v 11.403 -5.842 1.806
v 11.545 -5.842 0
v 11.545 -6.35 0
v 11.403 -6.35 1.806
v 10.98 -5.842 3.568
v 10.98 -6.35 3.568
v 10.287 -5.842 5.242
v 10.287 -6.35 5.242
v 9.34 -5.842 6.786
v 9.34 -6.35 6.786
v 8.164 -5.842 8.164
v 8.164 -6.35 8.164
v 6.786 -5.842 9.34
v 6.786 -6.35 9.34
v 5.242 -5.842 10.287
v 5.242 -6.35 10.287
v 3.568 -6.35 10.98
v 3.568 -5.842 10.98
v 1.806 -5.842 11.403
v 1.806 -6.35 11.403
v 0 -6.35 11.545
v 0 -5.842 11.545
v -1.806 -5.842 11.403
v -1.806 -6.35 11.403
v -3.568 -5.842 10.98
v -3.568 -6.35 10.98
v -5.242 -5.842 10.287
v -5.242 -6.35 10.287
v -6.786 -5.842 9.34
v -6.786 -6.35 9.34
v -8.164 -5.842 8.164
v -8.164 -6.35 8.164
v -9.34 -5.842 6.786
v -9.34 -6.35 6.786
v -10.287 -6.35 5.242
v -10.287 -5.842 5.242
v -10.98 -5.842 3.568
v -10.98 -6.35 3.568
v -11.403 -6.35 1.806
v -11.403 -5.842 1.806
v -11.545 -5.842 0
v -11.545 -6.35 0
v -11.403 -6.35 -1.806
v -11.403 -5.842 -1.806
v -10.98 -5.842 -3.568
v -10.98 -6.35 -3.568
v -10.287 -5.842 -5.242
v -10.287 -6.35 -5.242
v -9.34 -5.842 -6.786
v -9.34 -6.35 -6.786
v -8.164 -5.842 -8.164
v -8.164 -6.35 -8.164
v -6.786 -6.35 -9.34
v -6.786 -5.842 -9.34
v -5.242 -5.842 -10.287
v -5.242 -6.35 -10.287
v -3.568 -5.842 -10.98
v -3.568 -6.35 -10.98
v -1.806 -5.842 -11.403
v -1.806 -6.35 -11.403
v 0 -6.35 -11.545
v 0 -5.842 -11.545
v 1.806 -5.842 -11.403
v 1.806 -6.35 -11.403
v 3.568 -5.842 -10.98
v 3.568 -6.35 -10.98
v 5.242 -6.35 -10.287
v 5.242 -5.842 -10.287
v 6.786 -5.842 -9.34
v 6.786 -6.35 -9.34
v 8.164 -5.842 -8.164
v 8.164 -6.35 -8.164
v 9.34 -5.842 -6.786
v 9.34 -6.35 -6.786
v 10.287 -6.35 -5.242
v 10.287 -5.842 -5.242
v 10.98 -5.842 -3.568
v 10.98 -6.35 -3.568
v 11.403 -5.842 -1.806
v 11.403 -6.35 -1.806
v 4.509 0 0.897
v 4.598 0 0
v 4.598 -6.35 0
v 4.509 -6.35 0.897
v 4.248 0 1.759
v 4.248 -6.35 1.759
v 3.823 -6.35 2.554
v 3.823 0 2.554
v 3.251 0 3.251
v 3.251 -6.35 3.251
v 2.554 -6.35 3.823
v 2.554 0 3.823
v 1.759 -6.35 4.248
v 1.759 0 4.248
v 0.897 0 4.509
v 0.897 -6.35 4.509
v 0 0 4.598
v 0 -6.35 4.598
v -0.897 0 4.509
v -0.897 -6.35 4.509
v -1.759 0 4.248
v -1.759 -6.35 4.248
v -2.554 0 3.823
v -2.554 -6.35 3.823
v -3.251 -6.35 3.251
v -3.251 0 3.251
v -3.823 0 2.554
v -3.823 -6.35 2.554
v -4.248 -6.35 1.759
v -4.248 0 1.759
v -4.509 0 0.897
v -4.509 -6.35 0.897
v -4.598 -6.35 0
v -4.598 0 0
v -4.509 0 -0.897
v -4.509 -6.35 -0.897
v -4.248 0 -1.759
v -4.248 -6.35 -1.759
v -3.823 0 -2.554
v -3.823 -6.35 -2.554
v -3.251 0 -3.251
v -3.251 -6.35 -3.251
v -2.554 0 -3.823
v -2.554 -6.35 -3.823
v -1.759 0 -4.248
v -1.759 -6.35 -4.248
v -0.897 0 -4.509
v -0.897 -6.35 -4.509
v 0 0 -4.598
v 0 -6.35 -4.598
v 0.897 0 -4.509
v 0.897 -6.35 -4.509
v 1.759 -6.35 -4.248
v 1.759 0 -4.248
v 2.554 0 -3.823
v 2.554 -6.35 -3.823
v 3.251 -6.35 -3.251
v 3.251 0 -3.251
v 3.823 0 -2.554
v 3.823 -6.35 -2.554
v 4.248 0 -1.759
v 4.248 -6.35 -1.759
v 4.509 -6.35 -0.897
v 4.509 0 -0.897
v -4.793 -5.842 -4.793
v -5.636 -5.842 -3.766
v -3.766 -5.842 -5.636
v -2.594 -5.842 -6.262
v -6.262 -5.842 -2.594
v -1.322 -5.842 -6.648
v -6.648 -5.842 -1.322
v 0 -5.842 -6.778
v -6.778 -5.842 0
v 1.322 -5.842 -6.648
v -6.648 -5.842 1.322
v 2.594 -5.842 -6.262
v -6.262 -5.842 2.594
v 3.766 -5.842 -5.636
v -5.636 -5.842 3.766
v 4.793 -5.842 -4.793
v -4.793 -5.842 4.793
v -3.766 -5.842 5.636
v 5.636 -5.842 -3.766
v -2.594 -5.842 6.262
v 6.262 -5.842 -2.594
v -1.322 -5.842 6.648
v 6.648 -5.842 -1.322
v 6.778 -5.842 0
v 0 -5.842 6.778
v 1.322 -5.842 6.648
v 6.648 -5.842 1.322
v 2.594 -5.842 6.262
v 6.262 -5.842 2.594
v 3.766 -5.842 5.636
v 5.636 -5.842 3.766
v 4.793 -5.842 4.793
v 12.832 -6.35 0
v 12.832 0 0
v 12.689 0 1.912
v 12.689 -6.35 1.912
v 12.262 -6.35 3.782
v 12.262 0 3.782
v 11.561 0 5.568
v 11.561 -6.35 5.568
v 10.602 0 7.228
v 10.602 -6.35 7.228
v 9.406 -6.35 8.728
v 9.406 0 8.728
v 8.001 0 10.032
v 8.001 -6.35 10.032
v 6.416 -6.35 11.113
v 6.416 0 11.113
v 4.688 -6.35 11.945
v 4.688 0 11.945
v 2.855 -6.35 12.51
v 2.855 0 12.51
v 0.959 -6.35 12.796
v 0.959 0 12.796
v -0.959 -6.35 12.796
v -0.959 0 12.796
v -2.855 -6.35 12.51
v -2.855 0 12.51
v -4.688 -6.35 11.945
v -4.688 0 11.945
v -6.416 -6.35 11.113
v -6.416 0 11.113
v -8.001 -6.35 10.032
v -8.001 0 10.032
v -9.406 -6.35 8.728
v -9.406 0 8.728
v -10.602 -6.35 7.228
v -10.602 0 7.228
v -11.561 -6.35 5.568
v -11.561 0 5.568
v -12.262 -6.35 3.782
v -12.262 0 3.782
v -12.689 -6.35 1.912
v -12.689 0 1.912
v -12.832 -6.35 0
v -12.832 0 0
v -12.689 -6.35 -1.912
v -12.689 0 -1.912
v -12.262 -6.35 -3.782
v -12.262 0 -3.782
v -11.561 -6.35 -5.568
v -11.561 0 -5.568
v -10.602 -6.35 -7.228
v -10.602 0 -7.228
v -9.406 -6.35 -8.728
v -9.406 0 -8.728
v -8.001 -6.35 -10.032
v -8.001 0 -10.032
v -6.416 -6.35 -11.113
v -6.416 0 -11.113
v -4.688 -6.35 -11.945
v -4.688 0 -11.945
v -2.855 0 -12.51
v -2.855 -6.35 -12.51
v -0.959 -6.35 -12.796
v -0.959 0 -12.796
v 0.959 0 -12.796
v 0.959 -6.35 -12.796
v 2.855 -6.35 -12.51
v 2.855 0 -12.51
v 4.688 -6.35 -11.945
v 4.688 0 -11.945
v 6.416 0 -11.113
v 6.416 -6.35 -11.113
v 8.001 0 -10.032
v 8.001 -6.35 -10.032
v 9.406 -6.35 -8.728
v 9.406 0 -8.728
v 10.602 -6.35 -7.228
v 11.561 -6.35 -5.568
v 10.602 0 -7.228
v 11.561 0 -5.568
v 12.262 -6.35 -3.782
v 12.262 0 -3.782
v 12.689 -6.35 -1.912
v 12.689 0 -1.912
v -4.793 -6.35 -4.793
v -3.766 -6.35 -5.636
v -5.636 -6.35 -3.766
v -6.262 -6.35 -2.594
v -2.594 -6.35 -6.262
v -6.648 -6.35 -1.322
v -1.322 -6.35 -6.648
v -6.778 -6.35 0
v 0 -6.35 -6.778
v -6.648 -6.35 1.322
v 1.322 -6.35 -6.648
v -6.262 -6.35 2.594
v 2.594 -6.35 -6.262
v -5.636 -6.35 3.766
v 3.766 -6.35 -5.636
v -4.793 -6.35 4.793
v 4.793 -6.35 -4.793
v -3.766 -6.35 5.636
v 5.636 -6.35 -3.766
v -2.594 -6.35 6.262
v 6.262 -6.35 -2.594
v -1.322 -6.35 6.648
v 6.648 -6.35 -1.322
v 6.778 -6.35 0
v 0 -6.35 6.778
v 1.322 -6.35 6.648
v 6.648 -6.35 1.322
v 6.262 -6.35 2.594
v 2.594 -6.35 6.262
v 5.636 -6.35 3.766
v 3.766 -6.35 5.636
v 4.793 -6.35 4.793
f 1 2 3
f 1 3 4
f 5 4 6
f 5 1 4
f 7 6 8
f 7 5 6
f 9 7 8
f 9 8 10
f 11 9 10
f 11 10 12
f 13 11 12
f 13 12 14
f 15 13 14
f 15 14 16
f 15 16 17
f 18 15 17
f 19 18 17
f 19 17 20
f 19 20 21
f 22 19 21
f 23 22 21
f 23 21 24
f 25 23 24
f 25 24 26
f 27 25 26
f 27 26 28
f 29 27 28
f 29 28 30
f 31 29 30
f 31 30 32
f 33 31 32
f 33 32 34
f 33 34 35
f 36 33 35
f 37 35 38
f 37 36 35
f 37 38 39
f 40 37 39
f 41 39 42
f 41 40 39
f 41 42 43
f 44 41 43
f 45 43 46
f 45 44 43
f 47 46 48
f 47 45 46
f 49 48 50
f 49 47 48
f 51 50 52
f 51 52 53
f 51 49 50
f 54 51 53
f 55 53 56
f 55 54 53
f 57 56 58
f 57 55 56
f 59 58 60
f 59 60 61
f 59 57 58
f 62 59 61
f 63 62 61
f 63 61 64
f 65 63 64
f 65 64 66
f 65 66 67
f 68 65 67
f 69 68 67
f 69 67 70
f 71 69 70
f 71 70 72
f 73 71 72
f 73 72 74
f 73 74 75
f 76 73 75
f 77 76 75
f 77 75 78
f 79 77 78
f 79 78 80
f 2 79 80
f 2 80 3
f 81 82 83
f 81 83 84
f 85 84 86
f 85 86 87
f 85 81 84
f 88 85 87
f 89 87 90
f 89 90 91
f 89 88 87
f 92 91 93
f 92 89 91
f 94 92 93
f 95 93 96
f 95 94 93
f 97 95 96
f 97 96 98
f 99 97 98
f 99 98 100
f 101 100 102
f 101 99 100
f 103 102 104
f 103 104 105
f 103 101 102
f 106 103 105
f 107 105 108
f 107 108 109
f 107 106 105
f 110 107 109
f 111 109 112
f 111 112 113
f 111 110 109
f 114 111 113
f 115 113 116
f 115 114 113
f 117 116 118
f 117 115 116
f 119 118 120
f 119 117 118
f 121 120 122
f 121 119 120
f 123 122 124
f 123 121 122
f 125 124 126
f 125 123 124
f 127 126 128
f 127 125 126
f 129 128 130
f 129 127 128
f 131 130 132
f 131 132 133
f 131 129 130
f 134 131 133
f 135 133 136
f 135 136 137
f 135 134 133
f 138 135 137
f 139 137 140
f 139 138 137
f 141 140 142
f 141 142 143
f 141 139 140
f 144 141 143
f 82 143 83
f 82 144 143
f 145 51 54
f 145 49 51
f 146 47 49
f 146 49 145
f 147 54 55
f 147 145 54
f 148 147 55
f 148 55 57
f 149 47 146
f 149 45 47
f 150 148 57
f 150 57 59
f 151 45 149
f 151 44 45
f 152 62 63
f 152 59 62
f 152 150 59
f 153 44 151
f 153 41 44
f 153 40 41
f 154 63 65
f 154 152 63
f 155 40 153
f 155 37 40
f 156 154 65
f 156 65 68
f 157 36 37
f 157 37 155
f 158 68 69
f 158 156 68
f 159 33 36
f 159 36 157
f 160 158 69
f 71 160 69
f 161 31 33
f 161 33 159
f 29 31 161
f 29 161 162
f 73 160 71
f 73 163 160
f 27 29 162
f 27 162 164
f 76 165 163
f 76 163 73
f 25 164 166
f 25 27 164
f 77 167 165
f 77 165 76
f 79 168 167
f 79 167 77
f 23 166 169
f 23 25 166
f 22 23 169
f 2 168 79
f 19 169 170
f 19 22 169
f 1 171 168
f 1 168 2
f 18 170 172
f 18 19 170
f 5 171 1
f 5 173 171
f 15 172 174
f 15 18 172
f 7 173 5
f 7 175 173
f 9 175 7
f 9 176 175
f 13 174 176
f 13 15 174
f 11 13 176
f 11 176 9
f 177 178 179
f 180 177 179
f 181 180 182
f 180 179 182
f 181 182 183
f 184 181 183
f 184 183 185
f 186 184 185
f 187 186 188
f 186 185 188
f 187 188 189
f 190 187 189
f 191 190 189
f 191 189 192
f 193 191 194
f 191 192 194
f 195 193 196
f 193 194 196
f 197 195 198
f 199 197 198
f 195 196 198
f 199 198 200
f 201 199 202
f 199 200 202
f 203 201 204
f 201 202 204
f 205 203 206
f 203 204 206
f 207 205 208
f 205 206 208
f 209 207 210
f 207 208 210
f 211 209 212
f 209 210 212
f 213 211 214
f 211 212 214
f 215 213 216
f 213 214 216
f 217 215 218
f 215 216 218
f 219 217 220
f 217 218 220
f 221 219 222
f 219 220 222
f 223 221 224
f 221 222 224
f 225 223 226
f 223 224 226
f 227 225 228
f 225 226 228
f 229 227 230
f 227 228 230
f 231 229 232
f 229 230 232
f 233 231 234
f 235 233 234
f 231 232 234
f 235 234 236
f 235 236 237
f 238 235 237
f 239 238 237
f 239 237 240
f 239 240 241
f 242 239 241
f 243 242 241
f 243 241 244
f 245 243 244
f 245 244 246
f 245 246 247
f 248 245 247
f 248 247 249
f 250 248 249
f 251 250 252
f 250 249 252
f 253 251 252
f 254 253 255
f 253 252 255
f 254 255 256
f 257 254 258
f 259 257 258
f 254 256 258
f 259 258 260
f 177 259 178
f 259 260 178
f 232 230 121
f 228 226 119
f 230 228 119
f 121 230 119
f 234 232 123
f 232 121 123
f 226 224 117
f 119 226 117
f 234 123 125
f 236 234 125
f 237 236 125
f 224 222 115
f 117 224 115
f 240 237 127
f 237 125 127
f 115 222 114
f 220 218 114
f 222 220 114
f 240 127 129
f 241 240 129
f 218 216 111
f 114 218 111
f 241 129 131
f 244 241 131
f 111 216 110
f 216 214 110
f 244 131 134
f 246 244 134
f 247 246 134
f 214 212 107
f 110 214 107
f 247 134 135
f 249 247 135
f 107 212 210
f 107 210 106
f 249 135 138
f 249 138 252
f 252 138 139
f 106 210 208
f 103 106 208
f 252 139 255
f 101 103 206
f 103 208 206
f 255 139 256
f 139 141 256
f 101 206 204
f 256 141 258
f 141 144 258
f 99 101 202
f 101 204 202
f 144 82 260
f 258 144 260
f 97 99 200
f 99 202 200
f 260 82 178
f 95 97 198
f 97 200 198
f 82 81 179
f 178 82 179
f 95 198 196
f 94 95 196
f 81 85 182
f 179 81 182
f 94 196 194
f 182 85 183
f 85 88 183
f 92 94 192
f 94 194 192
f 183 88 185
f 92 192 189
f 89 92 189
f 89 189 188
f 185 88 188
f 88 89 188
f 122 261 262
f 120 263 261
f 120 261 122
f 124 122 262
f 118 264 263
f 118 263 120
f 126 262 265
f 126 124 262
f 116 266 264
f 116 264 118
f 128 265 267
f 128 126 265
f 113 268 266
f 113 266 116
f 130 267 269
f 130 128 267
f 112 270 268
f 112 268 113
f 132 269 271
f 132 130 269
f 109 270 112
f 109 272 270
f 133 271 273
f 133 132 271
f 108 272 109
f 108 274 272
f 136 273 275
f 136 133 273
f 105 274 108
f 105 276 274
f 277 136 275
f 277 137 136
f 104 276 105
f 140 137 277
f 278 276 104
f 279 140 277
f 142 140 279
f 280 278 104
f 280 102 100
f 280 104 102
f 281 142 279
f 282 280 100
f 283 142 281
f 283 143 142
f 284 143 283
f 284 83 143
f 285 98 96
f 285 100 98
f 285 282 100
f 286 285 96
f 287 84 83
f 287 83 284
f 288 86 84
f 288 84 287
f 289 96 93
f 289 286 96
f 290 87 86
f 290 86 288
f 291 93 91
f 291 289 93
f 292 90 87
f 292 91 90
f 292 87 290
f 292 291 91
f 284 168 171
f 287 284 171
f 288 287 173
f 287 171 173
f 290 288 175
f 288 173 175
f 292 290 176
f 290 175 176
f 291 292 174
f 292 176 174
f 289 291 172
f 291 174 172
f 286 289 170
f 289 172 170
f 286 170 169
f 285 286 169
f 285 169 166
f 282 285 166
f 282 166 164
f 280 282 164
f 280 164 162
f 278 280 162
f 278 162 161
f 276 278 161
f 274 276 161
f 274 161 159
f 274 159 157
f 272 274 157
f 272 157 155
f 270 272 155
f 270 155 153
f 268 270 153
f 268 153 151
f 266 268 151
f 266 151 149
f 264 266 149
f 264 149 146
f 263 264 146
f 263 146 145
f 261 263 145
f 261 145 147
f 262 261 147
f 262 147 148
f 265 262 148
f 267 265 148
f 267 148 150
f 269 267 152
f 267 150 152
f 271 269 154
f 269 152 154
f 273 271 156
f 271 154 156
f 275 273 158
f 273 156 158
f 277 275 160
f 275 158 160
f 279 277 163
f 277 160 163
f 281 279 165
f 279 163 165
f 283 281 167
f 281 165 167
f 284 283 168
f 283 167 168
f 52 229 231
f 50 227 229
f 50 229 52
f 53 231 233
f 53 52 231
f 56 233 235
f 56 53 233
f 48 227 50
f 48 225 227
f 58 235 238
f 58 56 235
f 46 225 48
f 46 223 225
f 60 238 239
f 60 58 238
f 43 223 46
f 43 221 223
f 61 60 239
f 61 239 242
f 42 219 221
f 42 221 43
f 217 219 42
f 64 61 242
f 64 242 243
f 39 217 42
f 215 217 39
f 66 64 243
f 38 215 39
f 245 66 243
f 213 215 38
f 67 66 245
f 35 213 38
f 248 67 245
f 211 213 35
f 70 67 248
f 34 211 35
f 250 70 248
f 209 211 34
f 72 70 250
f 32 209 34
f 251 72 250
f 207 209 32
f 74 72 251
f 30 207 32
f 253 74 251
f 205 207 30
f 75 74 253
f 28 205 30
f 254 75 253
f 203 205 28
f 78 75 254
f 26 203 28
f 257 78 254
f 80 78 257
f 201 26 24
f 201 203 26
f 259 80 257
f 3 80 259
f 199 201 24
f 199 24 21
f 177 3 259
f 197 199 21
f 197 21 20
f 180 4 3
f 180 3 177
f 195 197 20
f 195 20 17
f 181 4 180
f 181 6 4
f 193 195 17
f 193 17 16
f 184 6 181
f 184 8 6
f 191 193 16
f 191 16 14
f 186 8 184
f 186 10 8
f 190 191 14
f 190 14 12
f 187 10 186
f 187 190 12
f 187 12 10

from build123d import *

# Parameters (mm, degrees)
F0_R     = 12.831842
F0_R_2   = 11.545421
F1_DEPTH = 6.35
F2_R     = 11.571254
F2_R_2   = 6.76949
F3_DEPTH = 5.842
F4_R     = 6.77814
F4_R_2   = 4.597615
F5_DEPTH = 6.35


with BuildPart() as f1:
    # F0 (on Front) → F1 (new body)
    with BuildSketch(Plane.XZ):
        Circle(F0_R)
        Circle(F0_R_2, mode=Mode.SUBTRACT)
    extrude(amount=F1_DEPTH)

    # F2 (on Front) → F3 (join)
    with BuildSketch(Plane.XZ):
        Circle(F2_R)
        Circle(F2_R_2, mode=Mode.SUBTRACT)
    extrude(amount=F3_DEPTH)

    # F4 (on Front) → F5 (join)
    with BuildSketch(Plane.XZ):
        Circle(F4_R)
        Circle(F4_R_2, mode=Mode.SUBTRACT)
    extrude(amount=F5_DEPTH)


solid = f1.part
